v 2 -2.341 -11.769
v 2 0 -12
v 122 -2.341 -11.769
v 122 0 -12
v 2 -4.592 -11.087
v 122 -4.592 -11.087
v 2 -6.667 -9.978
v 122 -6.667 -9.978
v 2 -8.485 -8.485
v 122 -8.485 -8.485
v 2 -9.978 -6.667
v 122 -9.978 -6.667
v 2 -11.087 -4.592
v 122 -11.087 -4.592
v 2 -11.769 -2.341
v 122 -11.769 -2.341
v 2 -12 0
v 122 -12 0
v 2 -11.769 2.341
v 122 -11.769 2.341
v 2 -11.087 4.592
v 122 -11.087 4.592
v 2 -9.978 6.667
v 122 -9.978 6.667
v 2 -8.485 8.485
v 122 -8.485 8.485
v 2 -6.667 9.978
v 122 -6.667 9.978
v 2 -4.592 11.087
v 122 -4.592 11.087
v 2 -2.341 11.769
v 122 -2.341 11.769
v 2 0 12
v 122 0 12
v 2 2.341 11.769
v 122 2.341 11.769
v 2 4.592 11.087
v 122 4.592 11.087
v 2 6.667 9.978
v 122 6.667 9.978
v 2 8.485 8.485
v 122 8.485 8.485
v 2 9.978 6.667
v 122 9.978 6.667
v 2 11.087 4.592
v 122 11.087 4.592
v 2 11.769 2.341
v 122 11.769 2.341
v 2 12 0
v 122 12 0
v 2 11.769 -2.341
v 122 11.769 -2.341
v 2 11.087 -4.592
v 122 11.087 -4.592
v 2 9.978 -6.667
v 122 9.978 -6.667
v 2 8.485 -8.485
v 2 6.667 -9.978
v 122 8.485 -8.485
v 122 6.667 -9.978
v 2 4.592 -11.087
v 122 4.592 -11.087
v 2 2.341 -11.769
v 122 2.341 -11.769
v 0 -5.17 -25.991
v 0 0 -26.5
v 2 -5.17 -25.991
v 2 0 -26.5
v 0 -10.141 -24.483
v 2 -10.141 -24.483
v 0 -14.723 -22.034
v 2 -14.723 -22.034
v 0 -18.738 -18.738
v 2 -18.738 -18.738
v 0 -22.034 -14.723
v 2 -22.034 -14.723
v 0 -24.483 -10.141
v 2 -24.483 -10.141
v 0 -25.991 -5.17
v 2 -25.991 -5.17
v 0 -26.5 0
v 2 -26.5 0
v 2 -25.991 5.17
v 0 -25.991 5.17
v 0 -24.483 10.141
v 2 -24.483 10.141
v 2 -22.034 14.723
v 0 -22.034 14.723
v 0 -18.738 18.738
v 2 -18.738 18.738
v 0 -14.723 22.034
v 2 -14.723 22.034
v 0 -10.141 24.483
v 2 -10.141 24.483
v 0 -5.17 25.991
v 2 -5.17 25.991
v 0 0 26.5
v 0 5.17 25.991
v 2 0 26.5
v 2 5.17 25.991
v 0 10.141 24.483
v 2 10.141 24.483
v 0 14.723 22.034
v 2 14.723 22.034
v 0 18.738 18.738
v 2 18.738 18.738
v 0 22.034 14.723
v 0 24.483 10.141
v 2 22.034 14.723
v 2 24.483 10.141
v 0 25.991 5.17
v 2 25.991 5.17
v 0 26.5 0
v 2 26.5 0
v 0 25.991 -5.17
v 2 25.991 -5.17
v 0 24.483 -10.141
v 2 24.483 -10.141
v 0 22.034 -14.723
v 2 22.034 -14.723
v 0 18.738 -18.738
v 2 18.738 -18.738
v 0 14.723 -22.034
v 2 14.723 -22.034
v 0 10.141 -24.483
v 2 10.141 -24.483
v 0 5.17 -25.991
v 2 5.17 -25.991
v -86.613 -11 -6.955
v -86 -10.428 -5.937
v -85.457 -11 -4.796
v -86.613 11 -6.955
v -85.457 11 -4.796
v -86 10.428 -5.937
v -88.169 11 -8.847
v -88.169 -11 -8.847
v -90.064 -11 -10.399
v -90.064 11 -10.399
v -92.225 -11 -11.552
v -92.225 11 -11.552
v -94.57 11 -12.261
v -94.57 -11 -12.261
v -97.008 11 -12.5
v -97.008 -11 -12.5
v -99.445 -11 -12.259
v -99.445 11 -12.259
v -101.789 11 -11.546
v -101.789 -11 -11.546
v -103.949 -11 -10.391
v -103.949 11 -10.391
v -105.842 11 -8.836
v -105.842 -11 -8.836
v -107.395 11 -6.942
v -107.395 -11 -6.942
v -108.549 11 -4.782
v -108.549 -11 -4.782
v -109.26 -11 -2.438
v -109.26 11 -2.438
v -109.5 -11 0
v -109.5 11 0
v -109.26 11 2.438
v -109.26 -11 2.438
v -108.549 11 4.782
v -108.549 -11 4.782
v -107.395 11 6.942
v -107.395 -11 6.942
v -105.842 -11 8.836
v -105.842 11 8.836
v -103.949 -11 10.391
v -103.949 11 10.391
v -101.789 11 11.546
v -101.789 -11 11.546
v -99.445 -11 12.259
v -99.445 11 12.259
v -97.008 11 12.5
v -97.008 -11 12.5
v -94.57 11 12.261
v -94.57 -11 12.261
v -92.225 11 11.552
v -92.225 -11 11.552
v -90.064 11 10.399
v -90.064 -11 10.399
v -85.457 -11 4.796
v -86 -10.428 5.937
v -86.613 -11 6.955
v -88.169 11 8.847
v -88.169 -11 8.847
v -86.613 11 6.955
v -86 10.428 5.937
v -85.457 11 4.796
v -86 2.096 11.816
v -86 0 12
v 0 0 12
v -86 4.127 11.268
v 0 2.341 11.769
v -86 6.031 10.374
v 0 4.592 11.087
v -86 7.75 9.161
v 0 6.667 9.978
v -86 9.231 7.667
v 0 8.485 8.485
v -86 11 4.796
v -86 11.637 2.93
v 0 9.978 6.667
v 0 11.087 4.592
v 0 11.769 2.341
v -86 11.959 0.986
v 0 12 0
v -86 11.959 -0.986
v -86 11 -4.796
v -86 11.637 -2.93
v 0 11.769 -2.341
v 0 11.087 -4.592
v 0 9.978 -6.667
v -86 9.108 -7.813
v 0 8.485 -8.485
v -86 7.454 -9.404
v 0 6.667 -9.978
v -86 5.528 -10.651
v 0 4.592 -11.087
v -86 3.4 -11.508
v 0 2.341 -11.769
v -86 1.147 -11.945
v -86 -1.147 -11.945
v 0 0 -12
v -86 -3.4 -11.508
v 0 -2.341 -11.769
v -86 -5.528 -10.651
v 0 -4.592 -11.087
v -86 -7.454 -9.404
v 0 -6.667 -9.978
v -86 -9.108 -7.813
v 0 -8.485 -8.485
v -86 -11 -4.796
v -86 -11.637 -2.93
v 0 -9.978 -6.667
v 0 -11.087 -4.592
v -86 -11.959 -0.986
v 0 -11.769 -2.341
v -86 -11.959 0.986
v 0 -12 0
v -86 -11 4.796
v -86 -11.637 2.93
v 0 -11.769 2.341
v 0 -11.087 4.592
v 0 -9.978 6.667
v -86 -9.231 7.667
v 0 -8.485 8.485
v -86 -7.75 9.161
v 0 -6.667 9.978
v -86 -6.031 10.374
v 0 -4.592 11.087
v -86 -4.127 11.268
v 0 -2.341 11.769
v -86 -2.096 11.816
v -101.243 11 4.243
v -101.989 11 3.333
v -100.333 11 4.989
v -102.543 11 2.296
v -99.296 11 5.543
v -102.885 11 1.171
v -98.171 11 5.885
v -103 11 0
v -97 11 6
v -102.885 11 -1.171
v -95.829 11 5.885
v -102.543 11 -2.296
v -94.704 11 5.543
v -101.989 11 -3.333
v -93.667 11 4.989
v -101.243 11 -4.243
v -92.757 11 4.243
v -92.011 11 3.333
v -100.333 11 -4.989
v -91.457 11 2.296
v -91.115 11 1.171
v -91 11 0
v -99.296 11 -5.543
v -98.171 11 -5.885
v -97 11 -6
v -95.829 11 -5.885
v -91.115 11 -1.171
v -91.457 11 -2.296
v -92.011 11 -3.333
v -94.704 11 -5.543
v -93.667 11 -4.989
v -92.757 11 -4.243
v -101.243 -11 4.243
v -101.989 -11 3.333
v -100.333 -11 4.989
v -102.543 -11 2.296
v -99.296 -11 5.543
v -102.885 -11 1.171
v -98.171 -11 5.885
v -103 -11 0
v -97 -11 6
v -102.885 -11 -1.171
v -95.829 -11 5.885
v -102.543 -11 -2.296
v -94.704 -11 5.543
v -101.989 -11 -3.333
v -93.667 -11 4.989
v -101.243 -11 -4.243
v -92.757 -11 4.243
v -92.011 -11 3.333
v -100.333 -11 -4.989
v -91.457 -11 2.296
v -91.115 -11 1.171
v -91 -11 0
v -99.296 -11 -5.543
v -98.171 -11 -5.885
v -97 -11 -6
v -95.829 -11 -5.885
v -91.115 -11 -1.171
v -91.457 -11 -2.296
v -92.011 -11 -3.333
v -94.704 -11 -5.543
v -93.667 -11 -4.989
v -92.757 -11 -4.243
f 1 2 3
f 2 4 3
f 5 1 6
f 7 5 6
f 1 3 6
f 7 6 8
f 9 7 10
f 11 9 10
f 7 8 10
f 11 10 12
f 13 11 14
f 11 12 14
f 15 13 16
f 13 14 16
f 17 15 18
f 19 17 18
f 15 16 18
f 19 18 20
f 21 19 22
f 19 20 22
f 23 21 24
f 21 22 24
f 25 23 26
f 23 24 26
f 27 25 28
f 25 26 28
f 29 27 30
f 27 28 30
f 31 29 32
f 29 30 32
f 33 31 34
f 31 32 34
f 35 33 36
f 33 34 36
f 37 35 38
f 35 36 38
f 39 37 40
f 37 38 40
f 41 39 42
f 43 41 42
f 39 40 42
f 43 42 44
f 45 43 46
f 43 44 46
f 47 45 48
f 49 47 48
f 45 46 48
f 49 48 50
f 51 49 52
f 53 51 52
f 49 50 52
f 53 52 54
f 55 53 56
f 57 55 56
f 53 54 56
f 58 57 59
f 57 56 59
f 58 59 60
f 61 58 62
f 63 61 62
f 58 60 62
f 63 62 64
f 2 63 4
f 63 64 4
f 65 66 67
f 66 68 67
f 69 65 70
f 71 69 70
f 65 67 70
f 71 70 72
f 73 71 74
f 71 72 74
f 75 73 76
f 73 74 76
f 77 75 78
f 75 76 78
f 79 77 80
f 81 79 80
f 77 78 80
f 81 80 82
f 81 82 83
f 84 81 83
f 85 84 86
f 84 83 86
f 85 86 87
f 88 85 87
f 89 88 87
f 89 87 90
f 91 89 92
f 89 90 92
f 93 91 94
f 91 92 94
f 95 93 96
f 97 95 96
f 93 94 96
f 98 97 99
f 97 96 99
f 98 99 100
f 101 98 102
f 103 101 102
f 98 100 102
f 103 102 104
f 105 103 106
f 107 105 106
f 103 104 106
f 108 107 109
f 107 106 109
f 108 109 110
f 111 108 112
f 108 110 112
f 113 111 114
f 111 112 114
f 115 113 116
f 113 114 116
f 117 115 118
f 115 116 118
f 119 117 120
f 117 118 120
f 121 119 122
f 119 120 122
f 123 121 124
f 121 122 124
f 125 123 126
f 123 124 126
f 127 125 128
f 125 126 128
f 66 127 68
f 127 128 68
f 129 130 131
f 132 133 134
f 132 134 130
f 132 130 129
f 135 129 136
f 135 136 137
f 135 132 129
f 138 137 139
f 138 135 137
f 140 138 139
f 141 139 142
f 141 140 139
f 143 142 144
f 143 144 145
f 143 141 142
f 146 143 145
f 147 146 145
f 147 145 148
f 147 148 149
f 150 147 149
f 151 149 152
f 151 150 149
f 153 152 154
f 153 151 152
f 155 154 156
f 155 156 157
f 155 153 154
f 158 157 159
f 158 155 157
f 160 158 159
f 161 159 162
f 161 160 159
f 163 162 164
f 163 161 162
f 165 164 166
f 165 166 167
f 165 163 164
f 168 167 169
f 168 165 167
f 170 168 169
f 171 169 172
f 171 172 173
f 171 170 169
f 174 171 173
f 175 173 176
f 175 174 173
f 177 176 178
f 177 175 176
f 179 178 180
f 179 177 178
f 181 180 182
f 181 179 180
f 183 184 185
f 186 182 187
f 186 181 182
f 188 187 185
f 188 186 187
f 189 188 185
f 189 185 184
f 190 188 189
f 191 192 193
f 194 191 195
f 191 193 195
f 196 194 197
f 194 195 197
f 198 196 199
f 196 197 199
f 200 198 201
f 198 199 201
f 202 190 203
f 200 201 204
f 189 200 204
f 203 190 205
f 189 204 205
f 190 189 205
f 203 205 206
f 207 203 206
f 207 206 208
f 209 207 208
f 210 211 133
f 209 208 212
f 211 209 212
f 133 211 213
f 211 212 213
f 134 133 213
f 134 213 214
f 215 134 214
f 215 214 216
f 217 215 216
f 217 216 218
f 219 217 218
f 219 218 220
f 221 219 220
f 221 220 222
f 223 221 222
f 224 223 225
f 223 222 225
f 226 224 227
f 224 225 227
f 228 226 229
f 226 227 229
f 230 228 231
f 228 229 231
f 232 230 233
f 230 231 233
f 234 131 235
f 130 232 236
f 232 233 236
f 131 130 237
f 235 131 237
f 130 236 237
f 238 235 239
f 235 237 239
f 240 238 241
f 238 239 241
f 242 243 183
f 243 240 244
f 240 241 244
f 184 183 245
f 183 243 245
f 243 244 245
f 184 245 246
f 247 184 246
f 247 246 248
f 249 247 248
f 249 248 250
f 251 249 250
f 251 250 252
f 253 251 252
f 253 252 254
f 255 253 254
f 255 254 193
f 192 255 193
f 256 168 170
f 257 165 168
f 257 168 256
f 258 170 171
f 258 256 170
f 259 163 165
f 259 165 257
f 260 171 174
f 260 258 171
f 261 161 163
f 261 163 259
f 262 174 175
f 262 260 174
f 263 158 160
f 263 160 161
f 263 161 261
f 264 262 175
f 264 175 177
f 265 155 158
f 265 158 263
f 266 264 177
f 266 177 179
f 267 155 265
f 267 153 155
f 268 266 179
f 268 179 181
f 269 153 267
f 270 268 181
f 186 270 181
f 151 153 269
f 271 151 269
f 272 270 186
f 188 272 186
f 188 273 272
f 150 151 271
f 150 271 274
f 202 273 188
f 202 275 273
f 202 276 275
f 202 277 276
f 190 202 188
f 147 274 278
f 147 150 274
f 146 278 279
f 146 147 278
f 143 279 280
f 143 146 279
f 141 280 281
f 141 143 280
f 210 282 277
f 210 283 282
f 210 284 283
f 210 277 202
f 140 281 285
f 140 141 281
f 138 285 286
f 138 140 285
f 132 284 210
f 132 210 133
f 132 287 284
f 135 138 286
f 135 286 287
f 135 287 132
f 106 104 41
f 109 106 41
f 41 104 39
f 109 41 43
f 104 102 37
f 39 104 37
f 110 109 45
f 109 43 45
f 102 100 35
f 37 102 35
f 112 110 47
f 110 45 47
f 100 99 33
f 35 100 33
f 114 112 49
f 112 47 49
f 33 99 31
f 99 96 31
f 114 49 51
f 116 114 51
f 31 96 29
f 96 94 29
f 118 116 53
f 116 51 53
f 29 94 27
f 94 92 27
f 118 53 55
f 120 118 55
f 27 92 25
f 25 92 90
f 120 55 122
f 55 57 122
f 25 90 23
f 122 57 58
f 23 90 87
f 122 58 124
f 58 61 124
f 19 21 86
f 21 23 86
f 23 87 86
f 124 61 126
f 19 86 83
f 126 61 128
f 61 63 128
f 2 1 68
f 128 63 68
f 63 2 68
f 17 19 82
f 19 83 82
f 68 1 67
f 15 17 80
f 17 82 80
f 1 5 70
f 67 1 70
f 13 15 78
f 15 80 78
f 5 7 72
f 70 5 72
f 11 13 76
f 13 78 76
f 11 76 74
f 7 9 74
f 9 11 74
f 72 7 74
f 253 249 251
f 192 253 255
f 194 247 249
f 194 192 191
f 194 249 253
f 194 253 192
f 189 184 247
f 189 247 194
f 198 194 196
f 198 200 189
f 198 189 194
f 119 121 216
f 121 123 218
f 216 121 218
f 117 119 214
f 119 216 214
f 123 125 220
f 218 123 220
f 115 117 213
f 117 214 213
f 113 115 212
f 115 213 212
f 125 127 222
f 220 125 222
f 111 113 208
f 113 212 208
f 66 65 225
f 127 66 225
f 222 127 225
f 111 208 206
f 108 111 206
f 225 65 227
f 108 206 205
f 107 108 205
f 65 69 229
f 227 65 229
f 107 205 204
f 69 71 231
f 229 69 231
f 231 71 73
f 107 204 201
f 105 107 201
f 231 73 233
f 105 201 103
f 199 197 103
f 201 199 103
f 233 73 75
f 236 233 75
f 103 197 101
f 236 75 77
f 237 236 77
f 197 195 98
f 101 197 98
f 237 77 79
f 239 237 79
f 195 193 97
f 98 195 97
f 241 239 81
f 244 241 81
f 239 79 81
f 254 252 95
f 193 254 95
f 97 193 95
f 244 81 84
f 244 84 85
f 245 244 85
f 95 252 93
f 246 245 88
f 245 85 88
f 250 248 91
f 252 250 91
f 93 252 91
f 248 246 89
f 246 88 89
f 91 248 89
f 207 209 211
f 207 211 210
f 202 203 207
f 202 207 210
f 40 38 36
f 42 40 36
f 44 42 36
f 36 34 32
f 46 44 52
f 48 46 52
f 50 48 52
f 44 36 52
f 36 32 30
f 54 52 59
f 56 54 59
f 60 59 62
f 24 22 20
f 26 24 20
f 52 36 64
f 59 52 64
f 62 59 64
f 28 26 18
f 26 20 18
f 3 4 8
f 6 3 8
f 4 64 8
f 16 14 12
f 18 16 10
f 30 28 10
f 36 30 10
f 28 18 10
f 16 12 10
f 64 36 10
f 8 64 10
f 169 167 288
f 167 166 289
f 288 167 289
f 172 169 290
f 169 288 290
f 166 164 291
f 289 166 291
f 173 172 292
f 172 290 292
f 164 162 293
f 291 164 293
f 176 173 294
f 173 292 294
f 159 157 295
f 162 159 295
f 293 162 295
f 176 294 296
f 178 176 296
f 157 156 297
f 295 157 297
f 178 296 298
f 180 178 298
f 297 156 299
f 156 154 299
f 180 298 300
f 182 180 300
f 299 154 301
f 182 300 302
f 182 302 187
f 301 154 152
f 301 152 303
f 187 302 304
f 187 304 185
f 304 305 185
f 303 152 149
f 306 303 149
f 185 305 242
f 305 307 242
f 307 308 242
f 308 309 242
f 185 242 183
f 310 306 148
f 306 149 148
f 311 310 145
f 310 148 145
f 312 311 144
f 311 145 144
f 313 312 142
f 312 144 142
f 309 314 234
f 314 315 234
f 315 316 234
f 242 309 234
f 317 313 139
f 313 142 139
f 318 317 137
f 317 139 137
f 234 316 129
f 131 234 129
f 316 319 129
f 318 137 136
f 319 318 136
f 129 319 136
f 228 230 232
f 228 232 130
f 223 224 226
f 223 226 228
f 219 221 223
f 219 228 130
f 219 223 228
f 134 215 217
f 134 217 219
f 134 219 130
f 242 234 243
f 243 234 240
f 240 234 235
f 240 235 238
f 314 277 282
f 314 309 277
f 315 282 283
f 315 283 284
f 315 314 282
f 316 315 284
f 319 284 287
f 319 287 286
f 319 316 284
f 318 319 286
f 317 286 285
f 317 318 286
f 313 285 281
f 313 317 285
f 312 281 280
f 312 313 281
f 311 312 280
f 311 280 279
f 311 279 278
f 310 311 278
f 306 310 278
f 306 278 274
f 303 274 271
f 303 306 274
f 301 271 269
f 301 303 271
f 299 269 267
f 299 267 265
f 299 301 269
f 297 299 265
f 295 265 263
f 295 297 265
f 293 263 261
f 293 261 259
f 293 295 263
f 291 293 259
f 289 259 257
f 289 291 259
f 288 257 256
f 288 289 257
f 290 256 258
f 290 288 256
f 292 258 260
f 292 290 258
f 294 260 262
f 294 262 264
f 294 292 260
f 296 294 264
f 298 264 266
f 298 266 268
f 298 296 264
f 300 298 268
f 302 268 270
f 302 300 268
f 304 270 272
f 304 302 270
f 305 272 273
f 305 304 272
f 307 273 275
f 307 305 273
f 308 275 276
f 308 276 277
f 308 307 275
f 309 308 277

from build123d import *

# Parameters (mm, degrees)
SKETCH2_R           = 12
BOSS_EXTRUDE1_DEPTH = 86
SKETCH3_R           = 12.5
SKETCH3_R_2         = 6
BOSS_EXTRUDE2_DEPTH = 11


with BuildPart() as part:
    # Sketch1 → Revolve1 (revolve)
    with BuildSketch(Plane(origin=(0, 0, 0), x_dir=(1, 0, 0), z_dir=(0, 1, 0))):
        Polygon((0, 0), (0, 26.5), (2, 26.5), (2, 12), (122, 12), (122, 0), align=None)
    revolve(axis=Axis((122, 0, 0), (-1, 0, 0)))

    # Sketch2 → Boss-Extrude1 (add)
    with BuildSketch(Plane.ZY):
        Circle(SKETCH2_R)
    extrude(amount=BOSS_EXTRUDE1_DEPTH)

    # Sketch3 → Boss-Extrude2 (add, symmetric)
    with BuildSketch(Plane(origin=(0, 0, 0), x_dir=(1, 0, 0), z_dir=(0, 1, 0))):
        with Locations((-97, 0)):
            Circle(SKETCH3_R)
        with Locations((-97, 0)):
            Circle(SKETCH3_R_2, mode=Mode.SUBTRACT)
    extrude(amount=BOSS_EXTRUDE2_DEPTH, both=True)


solid = part.part
